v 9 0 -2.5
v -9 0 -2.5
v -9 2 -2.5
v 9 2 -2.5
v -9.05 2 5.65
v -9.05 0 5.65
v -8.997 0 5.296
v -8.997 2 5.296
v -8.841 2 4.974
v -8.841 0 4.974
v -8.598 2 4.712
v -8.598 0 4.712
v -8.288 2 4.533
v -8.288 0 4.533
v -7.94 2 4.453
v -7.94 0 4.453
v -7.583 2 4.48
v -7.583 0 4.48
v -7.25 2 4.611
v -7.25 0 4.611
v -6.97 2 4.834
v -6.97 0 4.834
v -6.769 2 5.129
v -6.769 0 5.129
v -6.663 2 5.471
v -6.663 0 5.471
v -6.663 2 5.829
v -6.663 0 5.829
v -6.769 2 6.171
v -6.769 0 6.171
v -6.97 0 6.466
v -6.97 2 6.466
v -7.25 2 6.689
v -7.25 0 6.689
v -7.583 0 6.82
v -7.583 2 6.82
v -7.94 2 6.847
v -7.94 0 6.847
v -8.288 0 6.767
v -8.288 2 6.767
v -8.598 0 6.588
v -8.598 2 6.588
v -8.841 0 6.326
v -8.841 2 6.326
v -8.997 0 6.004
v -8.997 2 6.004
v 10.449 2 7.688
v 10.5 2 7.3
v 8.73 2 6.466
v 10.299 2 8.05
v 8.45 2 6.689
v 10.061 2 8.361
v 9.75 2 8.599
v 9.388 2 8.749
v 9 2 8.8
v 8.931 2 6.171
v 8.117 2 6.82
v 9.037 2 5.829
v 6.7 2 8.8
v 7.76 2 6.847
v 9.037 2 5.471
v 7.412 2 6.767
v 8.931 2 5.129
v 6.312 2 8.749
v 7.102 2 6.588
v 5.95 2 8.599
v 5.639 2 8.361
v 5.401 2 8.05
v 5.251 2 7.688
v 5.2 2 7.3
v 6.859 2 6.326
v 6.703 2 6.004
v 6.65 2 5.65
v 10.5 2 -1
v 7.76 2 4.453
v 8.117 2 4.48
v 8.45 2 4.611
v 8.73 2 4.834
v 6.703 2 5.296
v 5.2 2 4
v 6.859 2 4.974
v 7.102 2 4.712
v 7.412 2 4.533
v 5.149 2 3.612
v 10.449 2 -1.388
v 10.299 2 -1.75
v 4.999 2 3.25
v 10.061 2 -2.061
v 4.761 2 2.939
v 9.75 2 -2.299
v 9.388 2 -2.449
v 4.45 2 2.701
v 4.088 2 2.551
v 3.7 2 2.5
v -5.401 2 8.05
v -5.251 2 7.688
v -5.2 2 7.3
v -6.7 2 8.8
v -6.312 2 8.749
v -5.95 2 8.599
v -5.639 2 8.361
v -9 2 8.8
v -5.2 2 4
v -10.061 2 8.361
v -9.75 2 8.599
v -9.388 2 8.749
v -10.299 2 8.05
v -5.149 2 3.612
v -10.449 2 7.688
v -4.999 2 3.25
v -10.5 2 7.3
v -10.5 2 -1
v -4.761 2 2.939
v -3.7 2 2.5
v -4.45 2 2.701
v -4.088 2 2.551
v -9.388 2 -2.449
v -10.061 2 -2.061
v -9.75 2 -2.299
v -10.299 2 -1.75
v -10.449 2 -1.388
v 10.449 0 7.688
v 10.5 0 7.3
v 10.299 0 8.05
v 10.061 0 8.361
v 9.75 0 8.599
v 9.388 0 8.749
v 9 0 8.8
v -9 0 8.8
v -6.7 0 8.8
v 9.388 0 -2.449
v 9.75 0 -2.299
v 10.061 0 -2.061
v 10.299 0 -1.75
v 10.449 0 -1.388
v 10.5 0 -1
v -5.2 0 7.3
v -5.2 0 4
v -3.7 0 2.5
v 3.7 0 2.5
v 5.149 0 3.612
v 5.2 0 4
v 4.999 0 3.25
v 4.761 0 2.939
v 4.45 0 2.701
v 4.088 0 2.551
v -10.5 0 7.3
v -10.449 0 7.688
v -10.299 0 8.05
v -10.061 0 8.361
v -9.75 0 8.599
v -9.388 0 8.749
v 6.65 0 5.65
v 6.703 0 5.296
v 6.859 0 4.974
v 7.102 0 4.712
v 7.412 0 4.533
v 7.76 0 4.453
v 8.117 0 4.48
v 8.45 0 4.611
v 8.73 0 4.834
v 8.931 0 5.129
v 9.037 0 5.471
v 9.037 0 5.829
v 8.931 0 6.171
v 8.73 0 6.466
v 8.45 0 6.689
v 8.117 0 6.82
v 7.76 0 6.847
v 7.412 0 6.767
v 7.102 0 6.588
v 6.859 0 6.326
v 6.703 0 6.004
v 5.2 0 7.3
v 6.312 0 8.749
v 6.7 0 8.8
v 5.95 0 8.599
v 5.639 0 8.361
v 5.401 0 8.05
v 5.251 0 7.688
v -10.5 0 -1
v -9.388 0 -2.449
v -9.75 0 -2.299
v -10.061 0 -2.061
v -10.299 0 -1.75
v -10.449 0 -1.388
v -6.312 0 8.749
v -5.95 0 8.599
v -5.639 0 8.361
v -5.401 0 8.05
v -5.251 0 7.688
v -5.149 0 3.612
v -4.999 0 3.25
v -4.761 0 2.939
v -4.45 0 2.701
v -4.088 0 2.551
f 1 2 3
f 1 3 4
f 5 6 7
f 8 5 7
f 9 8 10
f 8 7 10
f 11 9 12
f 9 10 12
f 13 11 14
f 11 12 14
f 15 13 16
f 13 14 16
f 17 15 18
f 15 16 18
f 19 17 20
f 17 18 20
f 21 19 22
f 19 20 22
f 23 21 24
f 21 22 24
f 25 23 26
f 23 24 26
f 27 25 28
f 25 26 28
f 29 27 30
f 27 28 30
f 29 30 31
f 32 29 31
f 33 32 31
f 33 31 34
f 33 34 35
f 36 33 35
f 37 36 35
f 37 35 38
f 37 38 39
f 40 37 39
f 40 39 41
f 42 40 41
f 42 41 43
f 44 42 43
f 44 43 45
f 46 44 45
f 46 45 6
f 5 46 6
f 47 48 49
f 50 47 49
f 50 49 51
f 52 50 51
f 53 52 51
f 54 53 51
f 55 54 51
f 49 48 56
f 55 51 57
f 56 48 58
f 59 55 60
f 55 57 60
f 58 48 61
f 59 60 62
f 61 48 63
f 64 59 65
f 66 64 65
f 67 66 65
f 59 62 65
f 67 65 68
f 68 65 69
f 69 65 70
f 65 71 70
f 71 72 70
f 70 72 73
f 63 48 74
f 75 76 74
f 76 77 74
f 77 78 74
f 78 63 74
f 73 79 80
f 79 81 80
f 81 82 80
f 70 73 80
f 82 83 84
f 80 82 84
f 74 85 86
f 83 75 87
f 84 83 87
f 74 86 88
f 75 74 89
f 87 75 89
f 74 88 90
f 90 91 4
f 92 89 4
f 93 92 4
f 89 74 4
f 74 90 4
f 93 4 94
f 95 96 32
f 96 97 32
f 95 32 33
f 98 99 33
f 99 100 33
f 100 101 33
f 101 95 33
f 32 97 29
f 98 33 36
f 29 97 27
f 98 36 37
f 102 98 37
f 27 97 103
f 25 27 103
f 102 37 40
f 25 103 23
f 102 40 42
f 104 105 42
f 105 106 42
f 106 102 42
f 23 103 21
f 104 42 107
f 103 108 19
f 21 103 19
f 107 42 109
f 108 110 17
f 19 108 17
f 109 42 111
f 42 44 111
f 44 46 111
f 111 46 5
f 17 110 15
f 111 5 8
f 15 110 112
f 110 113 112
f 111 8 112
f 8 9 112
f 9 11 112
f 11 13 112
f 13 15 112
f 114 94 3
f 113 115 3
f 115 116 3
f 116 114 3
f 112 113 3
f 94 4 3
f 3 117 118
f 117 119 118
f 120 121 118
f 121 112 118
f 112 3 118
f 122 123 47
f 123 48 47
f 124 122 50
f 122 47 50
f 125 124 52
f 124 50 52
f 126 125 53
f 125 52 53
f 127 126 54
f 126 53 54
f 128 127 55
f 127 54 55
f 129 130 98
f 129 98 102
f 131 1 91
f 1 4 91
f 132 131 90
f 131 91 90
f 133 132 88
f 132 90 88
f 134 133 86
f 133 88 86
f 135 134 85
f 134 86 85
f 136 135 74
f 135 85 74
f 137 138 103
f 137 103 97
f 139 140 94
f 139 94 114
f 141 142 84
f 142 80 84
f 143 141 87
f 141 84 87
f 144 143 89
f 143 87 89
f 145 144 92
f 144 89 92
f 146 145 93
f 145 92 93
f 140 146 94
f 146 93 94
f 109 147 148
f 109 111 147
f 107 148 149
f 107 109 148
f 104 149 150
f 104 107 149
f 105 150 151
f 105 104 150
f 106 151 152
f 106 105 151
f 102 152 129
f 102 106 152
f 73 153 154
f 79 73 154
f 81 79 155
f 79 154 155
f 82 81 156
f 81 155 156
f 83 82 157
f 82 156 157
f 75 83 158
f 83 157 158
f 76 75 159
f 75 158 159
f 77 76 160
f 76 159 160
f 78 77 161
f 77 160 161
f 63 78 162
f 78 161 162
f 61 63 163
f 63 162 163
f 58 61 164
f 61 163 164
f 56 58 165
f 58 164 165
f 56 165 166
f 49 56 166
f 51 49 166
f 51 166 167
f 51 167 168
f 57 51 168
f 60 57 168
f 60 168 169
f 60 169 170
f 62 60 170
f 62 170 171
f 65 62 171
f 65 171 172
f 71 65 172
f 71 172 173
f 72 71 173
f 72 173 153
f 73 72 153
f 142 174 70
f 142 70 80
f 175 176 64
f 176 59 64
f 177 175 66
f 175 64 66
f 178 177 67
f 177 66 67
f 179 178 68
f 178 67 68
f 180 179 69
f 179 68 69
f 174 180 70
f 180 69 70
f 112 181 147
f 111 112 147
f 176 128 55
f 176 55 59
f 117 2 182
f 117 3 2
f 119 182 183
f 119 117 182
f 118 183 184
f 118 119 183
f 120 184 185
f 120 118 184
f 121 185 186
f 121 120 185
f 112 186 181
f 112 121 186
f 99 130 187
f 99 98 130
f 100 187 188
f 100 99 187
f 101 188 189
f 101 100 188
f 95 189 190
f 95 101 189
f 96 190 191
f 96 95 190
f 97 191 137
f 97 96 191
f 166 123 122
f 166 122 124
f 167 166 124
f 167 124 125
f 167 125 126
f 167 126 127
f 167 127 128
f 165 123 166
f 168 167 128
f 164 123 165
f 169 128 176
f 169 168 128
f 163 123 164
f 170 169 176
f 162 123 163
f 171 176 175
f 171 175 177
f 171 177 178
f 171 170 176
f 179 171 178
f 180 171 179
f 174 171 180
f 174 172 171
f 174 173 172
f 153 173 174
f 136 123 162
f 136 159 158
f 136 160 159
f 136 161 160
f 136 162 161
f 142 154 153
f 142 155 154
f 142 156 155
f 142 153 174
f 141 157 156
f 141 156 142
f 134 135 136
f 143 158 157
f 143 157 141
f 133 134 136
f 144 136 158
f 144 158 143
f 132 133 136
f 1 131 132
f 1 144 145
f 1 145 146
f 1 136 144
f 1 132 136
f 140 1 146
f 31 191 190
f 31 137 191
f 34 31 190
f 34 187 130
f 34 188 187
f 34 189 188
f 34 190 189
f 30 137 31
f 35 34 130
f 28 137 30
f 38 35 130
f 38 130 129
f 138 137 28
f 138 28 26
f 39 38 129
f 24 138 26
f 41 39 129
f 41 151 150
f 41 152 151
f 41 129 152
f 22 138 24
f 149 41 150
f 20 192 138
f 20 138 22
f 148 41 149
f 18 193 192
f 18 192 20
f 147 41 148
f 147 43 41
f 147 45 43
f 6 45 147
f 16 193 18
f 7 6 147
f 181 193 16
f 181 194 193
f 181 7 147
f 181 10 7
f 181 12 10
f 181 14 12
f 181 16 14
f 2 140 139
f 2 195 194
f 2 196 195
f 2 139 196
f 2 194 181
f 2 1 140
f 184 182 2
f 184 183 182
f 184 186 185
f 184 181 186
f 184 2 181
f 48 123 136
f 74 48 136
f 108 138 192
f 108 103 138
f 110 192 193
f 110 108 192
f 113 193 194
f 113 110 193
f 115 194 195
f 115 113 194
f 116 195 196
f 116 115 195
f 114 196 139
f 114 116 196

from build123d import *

# Parameters (mm, degrees)
BOSS_EXTRUDE1_DEPTH  = 2
M2_CLEARANCE_HOLE1_D = 2.4
FILLET1_R            = 1.5


with BuildPart() as part:
    # Sketch1 → Boss-Extrude1 (new body)
    with BuildSketch(Plane(origin=(0, 0, 0), x_dir=(1, 0, 0), z_dir=(0, 1, 0))):
        Polygon((-10.5, 2.5), (10.5, 2.5), (10.5, -2.5), (10.5, -8.8), (5.2, -8.8), (5.2, -2.5), (-5.2, -2.5), (-5.2, -8.8), (-10.5, -8.8), (-10.5, -2.5), align=None)
    extrude(amount=BOSS_EXTRUDE1_DEPTH)

    # M2 Clearance Hole1 (through all)
    with Locations(Plane(origin=(0, 2, 0), x_dir=(1, 0, 0), z_dir=(0, 1, 0))):
        with Locations((-7.85, -5.65), (7.85, -5.65)):
            Hole(M2_CLEARANCE_HOLE1_D / 2)

    # Fillet1
    fillet1_edges = [part.edges().sort_by_distance(p)[0] for p in [
        (10.5, 1, 8.8),
        (5.2, 1, 8.8),
        (5.2, 1, 2.5),
        (-5.2, 1, 2.5),
        (-5.2, 1, 8.8),
        (-10.5, 1, 8.8),
        (-10.5, 1, -2.5),
        (10.5, 1, -2.5),
    ]]
    fillet(fillet1_edges, radius=FILLET1_R)


solid = part.part
